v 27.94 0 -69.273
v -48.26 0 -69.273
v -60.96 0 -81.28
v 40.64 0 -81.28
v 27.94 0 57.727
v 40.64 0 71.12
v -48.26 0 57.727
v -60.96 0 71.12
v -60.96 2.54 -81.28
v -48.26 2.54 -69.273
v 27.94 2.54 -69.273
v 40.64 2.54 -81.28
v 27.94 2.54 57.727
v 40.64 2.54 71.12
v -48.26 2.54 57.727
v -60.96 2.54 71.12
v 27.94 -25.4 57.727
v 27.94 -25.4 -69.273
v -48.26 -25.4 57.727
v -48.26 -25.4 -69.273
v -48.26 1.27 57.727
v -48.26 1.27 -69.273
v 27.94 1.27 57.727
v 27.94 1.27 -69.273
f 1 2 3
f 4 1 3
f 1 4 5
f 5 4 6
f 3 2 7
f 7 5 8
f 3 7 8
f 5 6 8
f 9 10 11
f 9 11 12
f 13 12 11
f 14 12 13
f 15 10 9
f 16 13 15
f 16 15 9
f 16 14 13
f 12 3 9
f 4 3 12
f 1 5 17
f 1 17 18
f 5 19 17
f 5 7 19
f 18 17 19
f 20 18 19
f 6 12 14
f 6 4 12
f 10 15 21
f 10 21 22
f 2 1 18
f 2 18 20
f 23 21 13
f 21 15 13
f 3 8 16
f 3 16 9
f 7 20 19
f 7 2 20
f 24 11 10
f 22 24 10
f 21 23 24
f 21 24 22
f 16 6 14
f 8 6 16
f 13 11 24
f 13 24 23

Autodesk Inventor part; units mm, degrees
ref_plane "YZ Plane" through (0, 0, 0) normal (1, 0, 0) x (0, 1, 0)
ref_plane "XY Plane" through (0, 0, 0) normal (0, 0, 1) x (1, 0, 0)
sketch "Sketch1" plane through (0, 0, 0) normal (0, 1, 0) x (-1, 0, 0)
  line L0 (60.96, -81.28) -> (-40.64, -81.28)
  line L1 (-40.64, -81.28) -> (-40.64, 71.12)
  line L2 (-40.64, 71.12) -> (60.96, 71.12)
  line L3 (60.96, 71.12) -> (60.96, -81.28)
  point P0 (0, 0)
  dimension "d0" = 152.4
  dimension "d1" = 101.6
extrude "Extrusion1" add sketch "Sketch1" along normal blind 2.54
sketch "Sketch2" plane through (0, 0, 0) normal (0, 1, 0) x (-1, 0, 0)
  line L0 (48.26, 57.7273) -> (-27.94, 57.7273)
  line L1 (-27.94, 57.7273) -> (-27.94, -69.2727)
  line L2 (-27.94, -69.2727) -> (48.26, -69.2727)
  line L3 (48.26, -69.2727) -> (48.26, 57.7273)
  line L4 (60.96, -81.28) -> (60.96, 71.12) projected
  line L5 (-40.64, 71.12) -> (-40.64, -81.28) projected
  point P0 (0, 0)
  dimension "d4" = 127
  dimension "d5" = 76.2
  dimension "d11" = 12.7
extrude "Extrusion2" add sketch "Sketch2" against normal blind 25.4
ref_plane "Work Plane1" through (0, 2.54, 0) normal (0, 1, 0) x (-1, 0, 0)
sketch "Sketch3" plane through (0, 2.54, 0) normal (0, 1, 0) x (-1, 0, 0)
  line L0 (48.26, 57.7273) -> (48.26, -69.2727) projected
  line L1 (-27.94, -69.2727) -> (-27.94, 57.7273) projected
  line L2 (48.26, 57.7273) -> (-27.94, 57.7273)
  line L3 (-27.94, 57.7273) -> (-27.94, -69.2727)
  line L4 (-27.94, -69.2727) -> (48.26, -69.2727)
  line L5 (48.26, -69.2727) -> (48.26, 57.7273)
  point P0 (0, 0)
extrude "Extrusion3" cut sketch "Sketch3" against normal blind 1.27
properties part number "Computer"
